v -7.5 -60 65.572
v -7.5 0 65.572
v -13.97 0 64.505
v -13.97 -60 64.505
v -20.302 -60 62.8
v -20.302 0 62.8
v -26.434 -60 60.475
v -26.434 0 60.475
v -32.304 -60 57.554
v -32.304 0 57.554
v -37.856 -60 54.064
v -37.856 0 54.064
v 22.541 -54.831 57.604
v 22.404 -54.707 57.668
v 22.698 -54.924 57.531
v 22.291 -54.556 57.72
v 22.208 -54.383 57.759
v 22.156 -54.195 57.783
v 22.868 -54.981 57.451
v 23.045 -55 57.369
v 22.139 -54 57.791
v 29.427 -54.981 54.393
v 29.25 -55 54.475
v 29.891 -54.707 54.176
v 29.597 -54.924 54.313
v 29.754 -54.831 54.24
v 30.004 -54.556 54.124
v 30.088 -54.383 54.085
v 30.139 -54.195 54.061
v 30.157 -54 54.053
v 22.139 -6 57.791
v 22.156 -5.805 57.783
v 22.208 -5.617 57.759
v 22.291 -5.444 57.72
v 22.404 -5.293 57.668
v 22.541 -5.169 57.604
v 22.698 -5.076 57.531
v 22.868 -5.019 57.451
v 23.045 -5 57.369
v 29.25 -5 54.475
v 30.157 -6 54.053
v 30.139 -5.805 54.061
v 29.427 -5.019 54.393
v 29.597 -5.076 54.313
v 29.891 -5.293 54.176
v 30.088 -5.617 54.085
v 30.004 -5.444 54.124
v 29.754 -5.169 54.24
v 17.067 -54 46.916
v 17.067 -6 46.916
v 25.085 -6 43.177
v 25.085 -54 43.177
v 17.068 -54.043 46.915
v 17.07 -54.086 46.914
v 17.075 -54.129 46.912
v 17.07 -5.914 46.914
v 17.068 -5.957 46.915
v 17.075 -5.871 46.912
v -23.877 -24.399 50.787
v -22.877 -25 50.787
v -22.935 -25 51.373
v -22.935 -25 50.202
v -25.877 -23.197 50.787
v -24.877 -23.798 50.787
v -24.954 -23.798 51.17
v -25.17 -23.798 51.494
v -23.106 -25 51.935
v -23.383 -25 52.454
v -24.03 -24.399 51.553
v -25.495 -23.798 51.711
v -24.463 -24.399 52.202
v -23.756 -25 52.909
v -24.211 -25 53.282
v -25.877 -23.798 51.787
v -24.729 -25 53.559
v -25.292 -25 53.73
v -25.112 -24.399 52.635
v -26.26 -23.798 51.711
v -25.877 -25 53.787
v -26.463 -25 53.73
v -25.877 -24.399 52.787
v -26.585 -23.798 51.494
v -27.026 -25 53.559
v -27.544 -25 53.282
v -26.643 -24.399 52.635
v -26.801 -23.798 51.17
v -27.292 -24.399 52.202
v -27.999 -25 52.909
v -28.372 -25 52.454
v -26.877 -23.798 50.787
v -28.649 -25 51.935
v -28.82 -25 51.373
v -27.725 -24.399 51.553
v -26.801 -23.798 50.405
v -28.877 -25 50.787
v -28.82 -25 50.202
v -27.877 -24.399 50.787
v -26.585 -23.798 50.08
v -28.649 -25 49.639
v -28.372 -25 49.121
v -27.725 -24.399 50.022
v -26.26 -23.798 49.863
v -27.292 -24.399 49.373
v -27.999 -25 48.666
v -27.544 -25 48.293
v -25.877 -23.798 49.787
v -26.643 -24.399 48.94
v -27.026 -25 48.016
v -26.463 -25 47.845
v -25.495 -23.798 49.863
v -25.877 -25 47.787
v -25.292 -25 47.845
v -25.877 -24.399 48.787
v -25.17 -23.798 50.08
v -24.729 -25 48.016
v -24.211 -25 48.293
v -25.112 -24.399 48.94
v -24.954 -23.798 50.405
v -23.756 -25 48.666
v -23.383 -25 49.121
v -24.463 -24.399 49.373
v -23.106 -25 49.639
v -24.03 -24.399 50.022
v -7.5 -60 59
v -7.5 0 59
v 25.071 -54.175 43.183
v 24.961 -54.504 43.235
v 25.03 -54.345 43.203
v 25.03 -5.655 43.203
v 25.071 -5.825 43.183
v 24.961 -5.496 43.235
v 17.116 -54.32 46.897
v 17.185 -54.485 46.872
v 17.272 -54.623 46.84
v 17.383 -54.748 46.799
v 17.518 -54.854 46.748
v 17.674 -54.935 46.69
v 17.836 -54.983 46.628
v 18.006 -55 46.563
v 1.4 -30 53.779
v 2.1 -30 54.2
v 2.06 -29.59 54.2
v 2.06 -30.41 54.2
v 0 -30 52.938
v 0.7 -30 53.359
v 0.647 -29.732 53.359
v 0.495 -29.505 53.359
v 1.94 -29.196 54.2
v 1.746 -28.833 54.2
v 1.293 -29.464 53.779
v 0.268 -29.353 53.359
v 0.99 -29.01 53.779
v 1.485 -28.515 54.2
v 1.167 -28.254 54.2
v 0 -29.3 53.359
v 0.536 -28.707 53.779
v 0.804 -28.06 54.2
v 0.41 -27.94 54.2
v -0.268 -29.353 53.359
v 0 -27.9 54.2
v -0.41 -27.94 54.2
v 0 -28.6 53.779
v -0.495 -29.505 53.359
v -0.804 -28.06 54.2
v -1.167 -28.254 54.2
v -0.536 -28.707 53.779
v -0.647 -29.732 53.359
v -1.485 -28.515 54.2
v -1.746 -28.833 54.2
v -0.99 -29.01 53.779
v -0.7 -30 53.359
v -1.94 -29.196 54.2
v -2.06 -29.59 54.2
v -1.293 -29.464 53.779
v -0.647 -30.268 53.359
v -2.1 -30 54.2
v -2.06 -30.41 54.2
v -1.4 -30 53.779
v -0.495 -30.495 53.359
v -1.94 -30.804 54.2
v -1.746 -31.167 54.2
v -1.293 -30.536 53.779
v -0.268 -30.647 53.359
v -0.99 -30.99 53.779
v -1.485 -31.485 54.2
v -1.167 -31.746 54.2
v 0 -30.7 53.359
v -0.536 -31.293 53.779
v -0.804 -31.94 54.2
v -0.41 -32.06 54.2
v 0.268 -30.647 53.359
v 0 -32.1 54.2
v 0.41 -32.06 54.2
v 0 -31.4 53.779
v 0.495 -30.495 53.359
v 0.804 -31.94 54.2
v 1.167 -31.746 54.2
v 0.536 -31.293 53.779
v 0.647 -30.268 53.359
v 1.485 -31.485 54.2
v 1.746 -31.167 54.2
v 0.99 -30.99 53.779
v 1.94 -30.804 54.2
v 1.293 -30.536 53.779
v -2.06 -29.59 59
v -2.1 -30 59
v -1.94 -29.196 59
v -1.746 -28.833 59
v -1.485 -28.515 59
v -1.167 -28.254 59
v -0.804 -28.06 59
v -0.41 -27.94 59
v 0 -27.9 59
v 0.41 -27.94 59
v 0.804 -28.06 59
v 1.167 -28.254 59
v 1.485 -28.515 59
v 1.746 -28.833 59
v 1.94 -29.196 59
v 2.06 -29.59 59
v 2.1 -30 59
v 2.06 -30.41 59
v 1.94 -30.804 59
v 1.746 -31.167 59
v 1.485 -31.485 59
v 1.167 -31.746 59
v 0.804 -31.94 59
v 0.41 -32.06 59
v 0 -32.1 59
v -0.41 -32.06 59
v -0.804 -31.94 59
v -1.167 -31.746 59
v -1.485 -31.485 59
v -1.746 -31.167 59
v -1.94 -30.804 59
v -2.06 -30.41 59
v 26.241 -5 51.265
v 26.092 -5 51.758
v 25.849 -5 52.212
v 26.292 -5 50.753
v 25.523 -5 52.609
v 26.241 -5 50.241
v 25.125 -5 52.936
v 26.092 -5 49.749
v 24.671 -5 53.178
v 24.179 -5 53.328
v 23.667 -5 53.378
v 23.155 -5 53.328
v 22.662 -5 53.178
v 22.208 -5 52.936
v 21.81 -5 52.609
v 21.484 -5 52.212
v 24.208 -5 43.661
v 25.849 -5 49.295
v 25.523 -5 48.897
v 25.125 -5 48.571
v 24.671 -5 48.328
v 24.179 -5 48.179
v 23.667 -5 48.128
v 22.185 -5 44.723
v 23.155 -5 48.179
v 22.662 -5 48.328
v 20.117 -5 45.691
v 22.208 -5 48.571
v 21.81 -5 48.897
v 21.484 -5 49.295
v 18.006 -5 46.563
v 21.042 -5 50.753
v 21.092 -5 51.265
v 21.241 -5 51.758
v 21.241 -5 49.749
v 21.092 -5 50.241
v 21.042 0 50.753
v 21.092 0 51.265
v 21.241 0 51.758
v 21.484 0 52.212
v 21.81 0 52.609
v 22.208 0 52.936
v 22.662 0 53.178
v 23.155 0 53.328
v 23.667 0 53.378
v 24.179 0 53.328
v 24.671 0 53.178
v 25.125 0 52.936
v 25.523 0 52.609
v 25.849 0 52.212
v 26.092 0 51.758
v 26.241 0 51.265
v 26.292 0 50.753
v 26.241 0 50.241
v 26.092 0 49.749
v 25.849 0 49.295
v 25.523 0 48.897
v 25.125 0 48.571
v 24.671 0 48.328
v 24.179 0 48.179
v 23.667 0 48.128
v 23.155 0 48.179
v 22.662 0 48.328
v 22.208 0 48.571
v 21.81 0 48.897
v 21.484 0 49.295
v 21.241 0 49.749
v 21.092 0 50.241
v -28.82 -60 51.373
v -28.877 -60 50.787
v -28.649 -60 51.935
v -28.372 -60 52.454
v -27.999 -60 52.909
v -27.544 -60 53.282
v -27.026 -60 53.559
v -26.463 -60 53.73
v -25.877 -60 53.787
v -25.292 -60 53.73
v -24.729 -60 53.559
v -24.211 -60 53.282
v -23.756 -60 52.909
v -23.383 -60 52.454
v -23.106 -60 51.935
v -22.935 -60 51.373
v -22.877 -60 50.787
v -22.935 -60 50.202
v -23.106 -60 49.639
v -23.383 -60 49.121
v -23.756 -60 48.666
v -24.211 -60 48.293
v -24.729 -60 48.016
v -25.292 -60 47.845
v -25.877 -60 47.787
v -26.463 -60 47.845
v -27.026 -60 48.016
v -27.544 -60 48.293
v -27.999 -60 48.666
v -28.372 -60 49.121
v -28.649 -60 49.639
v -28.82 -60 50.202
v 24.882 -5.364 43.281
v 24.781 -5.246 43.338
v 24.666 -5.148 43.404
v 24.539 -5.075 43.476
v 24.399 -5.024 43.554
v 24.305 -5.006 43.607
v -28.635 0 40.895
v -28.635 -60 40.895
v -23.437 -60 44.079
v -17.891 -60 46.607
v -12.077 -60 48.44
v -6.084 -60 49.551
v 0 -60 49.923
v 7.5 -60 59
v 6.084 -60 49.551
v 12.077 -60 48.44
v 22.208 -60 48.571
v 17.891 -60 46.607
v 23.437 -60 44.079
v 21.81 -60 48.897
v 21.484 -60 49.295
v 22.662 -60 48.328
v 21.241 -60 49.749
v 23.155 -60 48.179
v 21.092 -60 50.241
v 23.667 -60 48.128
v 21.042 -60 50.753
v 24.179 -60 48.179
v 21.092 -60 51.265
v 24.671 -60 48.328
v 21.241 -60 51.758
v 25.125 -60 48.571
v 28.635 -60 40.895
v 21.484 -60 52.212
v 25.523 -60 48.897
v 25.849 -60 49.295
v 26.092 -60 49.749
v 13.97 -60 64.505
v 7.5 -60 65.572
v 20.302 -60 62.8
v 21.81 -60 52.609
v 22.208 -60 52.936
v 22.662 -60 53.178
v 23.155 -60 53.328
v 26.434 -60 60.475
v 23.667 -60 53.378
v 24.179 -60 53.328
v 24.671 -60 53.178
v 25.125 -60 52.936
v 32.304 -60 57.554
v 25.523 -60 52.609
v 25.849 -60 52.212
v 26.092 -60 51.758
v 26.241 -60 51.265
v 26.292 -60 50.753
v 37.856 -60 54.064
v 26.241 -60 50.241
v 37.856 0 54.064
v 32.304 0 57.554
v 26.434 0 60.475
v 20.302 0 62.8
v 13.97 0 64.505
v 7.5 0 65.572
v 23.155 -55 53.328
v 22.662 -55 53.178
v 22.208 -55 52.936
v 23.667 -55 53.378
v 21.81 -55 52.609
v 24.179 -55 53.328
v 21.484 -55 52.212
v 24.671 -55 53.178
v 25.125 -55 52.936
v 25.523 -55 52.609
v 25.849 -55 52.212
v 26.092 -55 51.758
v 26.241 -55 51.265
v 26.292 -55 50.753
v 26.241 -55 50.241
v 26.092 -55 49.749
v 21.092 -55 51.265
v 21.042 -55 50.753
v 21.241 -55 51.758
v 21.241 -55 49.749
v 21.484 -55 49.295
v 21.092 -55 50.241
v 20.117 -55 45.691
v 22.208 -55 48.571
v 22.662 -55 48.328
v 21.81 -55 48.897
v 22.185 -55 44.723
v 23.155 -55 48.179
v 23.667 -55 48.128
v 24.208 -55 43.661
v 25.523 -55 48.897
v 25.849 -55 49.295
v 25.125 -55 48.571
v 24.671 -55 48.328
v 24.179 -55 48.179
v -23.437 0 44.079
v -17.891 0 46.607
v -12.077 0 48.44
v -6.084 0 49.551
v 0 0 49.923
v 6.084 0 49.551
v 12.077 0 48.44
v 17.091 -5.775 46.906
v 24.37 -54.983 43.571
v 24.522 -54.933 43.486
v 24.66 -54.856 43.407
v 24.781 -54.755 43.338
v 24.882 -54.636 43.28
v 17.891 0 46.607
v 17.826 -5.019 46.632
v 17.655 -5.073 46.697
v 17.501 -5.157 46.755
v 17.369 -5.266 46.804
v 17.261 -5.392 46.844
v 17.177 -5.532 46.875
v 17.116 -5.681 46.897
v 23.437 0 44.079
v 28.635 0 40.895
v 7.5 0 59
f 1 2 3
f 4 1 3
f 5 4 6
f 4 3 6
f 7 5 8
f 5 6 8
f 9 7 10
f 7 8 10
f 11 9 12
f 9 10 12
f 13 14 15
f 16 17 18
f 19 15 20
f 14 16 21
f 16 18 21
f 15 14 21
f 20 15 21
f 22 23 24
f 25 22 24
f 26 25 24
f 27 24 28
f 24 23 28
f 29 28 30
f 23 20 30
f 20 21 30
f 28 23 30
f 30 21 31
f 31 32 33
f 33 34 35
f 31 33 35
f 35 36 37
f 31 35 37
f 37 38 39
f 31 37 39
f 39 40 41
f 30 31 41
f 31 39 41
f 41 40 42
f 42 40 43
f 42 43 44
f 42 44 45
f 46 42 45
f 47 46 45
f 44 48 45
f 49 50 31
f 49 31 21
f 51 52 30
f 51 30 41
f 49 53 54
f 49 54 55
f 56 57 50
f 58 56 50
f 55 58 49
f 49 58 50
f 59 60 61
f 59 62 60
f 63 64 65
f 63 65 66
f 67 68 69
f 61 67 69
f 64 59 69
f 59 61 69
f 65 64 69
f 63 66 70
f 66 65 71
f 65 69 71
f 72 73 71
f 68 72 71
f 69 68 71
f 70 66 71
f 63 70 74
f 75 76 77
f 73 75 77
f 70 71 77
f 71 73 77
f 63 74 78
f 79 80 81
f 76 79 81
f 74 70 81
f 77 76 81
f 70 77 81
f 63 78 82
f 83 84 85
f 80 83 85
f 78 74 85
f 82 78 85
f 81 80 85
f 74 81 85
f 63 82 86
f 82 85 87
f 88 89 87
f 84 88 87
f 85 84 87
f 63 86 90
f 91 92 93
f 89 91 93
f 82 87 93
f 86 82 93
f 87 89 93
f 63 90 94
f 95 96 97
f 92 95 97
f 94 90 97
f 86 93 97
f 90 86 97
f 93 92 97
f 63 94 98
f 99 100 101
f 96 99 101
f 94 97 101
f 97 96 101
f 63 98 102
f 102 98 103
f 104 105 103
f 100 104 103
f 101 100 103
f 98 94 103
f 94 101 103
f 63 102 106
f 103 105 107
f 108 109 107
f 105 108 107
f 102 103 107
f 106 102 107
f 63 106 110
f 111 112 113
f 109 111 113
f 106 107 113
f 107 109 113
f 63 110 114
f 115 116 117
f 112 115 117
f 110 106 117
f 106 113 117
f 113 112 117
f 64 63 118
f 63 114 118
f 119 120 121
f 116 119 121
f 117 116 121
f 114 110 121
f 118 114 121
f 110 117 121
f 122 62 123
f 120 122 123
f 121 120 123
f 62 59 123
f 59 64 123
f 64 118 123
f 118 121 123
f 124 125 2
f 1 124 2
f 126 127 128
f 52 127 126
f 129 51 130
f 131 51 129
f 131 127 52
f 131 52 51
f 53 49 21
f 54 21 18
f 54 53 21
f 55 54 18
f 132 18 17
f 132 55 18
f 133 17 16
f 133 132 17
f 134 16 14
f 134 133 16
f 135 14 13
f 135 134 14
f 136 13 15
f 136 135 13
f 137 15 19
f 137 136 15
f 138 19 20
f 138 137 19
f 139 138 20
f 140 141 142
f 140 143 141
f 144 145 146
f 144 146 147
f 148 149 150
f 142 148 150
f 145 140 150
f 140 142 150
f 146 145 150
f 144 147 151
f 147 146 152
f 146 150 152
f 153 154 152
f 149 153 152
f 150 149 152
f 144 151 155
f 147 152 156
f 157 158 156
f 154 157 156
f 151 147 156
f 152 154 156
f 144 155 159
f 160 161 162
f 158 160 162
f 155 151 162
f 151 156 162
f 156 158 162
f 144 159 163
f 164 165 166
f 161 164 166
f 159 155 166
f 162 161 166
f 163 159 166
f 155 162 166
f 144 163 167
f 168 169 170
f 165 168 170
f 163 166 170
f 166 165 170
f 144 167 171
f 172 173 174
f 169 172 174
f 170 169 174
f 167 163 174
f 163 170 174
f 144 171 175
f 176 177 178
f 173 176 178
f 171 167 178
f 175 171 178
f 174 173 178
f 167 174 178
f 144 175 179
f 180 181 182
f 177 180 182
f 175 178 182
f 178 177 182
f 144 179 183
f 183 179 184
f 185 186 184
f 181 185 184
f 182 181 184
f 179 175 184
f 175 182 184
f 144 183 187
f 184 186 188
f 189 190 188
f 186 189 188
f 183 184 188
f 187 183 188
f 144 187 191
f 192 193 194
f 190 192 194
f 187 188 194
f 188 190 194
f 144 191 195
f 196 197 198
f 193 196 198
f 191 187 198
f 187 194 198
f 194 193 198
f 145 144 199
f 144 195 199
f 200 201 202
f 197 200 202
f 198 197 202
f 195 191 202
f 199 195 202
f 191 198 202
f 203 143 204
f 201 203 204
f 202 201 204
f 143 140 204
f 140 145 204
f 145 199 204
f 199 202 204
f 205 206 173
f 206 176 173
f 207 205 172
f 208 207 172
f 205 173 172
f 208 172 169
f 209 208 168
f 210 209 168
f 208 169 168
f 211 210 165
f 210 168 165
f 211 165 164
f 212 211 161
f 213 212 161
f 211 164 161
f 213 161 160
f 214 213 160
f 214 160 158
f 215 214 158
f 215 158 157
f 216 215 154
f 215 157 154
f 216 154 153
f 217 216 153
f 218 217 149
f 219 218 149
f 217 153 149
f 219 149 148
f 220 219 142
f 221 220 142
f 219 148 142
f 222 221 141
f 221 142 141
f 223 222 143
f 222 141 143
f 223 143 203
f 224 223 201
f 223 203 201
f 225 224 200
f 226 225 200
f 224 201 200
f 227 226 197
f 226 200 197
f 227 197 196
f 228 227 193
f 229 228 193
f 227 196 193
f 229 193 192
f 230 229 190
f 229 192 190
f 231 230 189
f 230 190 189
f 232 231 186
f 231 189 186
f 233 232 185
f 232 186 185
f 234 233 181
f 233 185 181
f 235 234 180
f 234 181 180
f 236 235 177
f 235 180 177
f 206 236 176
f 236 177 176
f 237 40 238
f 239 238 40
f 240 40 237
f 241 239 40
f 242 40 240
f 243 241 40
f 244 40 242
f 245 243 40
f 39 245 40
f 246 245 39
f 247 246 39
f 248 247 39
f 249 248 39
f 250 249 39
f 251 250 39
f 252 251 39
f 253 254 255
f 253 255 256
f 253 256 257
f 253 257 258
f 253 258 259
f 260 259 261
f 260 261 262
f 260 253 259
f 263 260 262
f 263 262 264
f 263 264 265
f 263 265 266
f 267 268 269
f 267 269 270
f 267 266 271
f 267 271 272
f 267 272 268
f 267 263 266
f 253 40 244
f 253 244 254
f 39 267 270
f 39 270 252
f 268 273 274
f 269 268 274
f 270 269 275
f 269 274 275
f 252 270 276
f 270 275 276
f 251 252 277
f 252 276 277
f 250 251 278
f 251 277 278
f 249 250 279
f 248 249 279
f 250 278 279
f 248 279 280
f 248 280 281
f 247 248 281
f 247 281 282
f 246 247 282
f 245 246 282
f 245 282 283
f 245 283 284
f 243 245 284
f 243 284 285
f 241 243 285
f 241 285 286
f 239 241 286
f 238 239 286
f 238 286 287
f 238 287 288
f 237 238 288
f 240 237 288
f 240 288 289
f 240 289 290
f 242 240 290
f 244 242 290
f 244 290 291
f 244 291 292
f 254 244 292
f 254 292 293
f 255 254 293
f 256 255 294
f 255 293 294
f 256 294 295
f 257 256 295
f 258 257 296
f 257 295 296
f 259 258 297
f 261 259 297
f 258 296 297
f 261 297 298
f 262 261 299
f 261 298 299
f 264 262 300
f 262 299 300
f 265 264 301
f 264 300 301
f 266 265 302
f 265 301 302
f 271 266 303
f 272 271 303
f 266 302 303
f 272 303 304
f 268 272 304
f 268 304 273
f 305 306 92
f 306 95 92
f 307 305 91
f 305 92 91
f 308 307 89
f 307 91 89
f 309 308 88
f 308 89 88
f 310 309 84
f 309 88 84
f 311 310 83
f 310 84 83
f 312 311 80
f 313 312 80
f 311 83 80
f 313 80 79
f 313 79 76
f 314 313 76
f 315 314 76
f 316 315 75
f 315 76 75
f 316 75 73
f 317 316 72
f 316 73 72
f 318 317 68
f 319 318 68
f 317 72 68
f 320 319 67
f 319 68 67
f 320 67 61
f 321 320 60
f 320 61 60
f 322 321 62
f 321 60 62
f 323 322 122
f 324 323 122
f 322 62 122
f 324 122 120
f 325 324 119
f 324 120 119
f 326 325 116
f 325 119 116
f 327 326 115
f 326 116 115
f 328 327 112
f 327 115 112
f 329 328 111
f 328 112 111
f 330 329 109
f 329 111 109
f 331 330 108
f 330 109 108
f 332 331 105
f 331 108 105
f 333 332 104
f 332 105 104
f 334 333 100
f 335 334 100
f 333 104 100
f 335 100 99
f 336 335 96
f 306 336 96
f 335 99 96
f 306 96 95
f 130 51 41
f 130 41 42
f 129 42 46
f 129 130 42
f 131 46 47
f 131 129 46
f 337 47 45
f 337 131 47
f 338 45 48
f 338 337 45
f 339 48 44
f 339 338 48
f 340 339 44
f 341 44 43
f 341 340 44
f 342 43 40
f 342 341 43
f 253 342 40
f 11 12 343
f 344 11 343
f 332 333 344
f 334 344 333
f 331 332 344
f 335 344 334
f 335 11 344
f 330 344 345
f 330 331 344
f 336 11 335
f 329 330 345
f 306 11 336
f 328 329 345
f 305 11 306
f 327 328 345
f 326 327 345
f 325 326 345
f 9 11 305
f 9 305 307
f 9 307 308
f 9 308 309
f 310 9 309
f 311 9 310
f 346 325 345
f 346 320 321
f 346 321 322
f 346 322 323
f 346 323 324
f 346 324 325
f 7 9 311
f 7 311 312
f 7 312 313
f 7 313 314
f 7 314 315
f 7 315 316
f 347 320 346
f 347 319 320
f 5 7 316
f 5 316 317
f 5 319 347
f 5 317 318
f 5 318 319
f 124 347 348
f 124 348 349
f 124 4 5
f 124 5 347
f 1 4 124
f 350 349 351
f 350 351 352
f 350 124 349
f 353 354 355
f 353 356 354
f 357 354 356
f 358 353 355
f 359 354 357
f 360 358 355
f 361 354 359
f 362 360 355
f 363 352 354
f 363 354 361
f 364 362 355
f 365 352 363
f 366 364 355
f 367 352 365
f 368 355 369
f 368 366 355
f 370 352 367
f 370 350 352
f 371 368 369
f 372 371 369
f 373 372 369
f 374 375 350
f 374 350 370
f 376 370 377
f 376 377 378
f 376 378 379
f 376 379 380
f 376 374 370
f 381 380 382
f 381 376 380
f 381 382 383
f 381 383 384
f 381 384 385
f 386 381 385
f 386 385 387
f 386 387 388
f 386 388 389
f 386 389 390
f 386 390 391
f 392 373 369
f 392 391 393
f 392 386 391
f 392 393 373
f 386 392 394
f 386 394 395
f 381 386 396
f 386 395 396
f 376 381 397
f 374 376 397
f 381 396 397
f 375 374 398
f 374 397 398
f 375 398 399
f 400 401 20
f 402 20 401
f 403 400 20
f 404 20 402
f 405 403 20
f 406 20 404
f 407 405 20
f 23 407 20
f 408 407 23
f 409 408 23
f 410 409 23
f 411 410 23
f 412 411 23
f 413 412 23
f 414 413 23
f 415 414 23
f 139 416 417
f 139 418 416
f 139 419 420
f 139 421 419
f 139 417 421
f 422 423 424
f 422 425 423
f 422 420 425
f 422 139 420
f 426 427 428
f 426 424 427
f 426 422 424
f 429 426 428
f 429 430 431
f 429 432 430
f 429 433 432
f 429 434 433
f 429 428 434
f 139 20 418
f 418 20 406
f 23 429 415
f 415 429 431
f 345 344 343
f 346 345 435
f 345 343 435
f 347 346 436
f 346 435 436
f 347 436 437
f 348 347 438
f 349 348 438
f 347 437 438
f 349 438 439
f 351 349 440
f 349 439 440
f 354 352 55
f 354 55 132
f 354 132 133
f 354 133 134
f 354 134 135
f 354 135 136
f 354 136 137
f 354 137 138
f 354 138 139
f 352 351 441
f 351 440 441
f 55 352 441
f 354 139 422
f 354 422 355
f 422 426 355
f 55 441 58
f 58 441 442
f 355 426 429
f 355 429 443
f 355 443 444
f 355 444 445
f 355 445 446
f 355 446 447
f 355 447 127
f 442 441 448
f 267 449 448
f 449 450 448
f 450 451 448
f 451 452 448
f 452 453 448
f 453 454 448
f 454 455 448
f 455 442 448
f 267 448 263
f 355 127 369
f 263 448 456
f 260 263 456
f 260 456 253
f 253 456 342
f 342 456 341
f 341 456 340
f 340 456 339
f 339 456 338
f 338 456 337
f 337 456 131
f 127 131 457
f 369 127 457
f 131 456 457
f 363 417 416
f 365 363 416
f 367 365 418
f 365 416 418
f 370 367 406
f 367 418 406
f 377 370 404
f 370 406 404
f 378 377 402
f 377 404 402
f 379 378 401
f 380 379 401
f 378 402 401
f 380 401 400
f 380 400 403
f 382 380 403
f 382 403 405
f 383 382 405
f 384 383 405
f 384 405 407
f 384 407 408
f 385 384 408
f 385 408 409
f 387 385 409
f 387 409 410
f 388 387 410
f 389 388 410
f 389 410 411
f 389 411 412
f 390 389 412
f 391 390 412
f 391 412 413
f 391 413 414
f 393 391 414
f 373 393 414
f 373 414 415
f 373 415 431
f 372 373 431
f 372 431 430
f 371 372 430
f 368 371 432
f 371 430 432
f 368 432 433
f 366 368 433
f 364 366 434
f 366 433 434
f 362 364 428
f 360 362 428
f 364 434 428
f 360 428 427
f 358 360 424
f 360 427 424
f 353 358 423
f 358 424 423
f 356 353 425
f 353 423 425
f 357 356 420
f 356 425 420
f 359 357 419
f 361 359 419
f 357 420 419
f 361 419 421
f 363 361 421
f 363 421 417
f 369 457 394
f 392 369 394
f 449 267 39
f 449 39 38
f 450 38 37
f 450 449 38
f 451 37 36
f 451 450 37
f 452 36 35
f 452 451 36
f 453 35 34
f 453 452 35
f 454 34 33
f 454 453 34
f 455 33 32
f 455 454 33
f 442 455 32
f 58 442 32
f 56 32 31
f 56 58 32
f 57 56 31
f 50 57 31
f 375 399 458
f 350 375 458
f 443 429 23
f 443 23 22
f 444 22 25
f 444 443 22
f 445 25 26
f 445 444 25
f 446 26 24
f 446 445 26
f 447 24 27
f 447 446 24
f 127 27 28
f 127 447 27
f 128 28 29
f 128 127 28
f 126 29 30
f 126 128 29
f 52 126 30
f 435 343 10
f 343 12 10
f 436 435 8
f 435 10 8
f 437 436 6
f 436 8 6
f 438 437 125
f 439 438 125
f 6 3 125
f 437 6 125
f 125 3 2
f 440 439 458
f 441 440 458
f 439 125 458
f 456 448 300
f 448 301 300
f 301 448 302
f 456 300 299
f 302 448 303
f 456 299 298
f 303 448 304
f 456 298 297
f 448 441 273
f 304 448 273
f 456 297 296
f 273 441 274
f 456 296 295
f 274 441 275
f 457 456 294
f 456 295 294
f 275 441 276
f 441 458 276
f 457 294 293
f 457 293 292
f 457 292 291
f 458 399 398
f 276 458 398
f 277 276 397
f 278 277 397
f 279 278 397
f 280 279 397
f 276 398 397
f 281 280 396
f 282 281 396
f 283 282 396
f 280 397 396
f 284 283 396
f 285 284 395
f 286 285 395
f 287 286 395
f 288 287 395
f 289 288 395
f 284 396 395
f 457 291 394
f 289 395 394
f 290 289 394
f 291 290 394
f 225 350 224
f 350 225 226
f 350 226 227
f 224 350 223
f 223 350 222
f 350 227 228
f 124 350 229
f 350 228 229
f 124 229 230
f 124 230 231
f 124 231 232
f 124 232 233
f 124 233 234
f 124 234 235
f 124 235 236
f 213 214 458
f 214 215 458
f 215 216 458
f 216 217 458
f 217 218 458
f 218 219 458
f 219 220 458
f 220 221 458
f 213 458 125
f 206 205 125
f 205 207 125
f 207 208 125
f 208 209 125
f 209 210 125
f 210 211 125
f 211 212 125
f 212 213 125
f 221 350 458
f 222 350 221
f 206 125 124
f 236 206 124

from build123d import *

# Parameters (mm, degrees)
F3_DEPTH  = 60
F9_D      = 6
F9_DEPTH  = 35
F9_TIP    = 1.8025818571
F10_D     = 4.2
F10_DEPTH = 4.8
F10_TIP   = 1.2618073
F11_DEPTH = 12
F12_D     = 5.25


# Not quite as in the source:
# - a feature of the source that left no trace in its solid (it failed there, or was rolled back) is left out
# - a feature names something its author has since deleted; it is built from what else it names


with BuildPart() as f3:
    # F2 (on Front) → F3 (new body)
    with BuildSketch(Plane.XZ):
        with BuildLine():
            ThreePointArc((-28.634656432, 40.894527507), (0, 49.923), (28.634656432, 40.894527507))
            Line((28.634656432, 40.894527507), (37.8560447992, 54.0640349231))
            ThreePointArc((37.8560447992, 54.0640349231), (23.3966615381, 61.7138252653), (7.5, 65.5724789832))
            Line((7.5, 65.5724789832), (7.5, 59))
            Line((7.5, 59), (0, 59))
            Line((0, 59), (-7.5, 59))
            Line((-7.5, 59), (-7.5, 65.5724789832))
            ThreePointArc((-7.5, 65.5724789832), (-23.3966615381, 61.7138252653), (-37.8560447992, 54.0640349231))
            Line((-37.8560447992, 54.0640349231), (-28.634656432, 40.894527507))
        make_face()
    extrude(amount=F3_DEPTH)

    # F9
    with Locations(Plane.XZ.offset(60)):
        with Locations((-25.8774584852, 50.7873718787)):
            Hole(F9_D / 2, depth=F9_DEPTH)
            with Locations((0, 0, -(F9_DEPTH + F9_TIP / 2))):  # 118° drill point
                Cone(0, F9_D / 2, F9_TIP, mode=Mode.SUBTRACT)

    # F10
    with Locations(Plane.XY.offset(59)):
        with Locations((0, -30)):
            Hole(F10_D / 2, depth=F10_DEPTH)
            with Locations((0, 0, -(F10_DEPTH + F10_TIP / 2))):  # 118° drill point
                Cone(0, F10_D / 2, F10_TIP, mode=Mode.SUBTRACT)

    # F7 (on line) → F11 (cut)
    with BuildSketch(Plane(origin=(21.0180858076, 0, 45.0734304703), x_dir=(0.906307787, 0, -0.4226182617), z_dir=(0.4226182617, 0, 0.906307787))):
        with BuildLine():
            Line((0, -5), (0, -55))
            Line((0, -55), (3.487631816, -55))
            ThreePointArc((3.487631816, -55), (4.1947385971, -54.7071067812), (4.487631816, -54))
            Line((4.487631816, -54), (4.487631816, -6))
            ThreePointArc((4.487631816, -6), (4.1947385971, -5.2928932188), (3.487631816, -5))
            Line((3.487631816, -5), (0, -5))
        make_face()
        with BuildLine():
            Line((-3.359387327, -55), (0, -55))
            Line((0, -55), (0, -5))
            Line((0, -5), (-3.359387327, -5))
            ThreePointArc((-3.359387327, -5), (-4.0664941082, -5.2928932188), (-4.359387327, -6))
            Line((-4.359387327, -6), (-4.359387327, -54))
            ThreePointArc((-4.359387327, -54), (-4.0664941082, -54.7071067812), (-3.359387327, -55))
        make_face()
    extrude(amount=F11_DEPTH, mode=Mode.SUBTRACT)

    # F12 (through all)
    with Locations(Plane.XZ.offset(60)):
        with Locations((23.6666226575, 50.7532360741)):
            Hole(F12_D / 2)


solid = f3.part
